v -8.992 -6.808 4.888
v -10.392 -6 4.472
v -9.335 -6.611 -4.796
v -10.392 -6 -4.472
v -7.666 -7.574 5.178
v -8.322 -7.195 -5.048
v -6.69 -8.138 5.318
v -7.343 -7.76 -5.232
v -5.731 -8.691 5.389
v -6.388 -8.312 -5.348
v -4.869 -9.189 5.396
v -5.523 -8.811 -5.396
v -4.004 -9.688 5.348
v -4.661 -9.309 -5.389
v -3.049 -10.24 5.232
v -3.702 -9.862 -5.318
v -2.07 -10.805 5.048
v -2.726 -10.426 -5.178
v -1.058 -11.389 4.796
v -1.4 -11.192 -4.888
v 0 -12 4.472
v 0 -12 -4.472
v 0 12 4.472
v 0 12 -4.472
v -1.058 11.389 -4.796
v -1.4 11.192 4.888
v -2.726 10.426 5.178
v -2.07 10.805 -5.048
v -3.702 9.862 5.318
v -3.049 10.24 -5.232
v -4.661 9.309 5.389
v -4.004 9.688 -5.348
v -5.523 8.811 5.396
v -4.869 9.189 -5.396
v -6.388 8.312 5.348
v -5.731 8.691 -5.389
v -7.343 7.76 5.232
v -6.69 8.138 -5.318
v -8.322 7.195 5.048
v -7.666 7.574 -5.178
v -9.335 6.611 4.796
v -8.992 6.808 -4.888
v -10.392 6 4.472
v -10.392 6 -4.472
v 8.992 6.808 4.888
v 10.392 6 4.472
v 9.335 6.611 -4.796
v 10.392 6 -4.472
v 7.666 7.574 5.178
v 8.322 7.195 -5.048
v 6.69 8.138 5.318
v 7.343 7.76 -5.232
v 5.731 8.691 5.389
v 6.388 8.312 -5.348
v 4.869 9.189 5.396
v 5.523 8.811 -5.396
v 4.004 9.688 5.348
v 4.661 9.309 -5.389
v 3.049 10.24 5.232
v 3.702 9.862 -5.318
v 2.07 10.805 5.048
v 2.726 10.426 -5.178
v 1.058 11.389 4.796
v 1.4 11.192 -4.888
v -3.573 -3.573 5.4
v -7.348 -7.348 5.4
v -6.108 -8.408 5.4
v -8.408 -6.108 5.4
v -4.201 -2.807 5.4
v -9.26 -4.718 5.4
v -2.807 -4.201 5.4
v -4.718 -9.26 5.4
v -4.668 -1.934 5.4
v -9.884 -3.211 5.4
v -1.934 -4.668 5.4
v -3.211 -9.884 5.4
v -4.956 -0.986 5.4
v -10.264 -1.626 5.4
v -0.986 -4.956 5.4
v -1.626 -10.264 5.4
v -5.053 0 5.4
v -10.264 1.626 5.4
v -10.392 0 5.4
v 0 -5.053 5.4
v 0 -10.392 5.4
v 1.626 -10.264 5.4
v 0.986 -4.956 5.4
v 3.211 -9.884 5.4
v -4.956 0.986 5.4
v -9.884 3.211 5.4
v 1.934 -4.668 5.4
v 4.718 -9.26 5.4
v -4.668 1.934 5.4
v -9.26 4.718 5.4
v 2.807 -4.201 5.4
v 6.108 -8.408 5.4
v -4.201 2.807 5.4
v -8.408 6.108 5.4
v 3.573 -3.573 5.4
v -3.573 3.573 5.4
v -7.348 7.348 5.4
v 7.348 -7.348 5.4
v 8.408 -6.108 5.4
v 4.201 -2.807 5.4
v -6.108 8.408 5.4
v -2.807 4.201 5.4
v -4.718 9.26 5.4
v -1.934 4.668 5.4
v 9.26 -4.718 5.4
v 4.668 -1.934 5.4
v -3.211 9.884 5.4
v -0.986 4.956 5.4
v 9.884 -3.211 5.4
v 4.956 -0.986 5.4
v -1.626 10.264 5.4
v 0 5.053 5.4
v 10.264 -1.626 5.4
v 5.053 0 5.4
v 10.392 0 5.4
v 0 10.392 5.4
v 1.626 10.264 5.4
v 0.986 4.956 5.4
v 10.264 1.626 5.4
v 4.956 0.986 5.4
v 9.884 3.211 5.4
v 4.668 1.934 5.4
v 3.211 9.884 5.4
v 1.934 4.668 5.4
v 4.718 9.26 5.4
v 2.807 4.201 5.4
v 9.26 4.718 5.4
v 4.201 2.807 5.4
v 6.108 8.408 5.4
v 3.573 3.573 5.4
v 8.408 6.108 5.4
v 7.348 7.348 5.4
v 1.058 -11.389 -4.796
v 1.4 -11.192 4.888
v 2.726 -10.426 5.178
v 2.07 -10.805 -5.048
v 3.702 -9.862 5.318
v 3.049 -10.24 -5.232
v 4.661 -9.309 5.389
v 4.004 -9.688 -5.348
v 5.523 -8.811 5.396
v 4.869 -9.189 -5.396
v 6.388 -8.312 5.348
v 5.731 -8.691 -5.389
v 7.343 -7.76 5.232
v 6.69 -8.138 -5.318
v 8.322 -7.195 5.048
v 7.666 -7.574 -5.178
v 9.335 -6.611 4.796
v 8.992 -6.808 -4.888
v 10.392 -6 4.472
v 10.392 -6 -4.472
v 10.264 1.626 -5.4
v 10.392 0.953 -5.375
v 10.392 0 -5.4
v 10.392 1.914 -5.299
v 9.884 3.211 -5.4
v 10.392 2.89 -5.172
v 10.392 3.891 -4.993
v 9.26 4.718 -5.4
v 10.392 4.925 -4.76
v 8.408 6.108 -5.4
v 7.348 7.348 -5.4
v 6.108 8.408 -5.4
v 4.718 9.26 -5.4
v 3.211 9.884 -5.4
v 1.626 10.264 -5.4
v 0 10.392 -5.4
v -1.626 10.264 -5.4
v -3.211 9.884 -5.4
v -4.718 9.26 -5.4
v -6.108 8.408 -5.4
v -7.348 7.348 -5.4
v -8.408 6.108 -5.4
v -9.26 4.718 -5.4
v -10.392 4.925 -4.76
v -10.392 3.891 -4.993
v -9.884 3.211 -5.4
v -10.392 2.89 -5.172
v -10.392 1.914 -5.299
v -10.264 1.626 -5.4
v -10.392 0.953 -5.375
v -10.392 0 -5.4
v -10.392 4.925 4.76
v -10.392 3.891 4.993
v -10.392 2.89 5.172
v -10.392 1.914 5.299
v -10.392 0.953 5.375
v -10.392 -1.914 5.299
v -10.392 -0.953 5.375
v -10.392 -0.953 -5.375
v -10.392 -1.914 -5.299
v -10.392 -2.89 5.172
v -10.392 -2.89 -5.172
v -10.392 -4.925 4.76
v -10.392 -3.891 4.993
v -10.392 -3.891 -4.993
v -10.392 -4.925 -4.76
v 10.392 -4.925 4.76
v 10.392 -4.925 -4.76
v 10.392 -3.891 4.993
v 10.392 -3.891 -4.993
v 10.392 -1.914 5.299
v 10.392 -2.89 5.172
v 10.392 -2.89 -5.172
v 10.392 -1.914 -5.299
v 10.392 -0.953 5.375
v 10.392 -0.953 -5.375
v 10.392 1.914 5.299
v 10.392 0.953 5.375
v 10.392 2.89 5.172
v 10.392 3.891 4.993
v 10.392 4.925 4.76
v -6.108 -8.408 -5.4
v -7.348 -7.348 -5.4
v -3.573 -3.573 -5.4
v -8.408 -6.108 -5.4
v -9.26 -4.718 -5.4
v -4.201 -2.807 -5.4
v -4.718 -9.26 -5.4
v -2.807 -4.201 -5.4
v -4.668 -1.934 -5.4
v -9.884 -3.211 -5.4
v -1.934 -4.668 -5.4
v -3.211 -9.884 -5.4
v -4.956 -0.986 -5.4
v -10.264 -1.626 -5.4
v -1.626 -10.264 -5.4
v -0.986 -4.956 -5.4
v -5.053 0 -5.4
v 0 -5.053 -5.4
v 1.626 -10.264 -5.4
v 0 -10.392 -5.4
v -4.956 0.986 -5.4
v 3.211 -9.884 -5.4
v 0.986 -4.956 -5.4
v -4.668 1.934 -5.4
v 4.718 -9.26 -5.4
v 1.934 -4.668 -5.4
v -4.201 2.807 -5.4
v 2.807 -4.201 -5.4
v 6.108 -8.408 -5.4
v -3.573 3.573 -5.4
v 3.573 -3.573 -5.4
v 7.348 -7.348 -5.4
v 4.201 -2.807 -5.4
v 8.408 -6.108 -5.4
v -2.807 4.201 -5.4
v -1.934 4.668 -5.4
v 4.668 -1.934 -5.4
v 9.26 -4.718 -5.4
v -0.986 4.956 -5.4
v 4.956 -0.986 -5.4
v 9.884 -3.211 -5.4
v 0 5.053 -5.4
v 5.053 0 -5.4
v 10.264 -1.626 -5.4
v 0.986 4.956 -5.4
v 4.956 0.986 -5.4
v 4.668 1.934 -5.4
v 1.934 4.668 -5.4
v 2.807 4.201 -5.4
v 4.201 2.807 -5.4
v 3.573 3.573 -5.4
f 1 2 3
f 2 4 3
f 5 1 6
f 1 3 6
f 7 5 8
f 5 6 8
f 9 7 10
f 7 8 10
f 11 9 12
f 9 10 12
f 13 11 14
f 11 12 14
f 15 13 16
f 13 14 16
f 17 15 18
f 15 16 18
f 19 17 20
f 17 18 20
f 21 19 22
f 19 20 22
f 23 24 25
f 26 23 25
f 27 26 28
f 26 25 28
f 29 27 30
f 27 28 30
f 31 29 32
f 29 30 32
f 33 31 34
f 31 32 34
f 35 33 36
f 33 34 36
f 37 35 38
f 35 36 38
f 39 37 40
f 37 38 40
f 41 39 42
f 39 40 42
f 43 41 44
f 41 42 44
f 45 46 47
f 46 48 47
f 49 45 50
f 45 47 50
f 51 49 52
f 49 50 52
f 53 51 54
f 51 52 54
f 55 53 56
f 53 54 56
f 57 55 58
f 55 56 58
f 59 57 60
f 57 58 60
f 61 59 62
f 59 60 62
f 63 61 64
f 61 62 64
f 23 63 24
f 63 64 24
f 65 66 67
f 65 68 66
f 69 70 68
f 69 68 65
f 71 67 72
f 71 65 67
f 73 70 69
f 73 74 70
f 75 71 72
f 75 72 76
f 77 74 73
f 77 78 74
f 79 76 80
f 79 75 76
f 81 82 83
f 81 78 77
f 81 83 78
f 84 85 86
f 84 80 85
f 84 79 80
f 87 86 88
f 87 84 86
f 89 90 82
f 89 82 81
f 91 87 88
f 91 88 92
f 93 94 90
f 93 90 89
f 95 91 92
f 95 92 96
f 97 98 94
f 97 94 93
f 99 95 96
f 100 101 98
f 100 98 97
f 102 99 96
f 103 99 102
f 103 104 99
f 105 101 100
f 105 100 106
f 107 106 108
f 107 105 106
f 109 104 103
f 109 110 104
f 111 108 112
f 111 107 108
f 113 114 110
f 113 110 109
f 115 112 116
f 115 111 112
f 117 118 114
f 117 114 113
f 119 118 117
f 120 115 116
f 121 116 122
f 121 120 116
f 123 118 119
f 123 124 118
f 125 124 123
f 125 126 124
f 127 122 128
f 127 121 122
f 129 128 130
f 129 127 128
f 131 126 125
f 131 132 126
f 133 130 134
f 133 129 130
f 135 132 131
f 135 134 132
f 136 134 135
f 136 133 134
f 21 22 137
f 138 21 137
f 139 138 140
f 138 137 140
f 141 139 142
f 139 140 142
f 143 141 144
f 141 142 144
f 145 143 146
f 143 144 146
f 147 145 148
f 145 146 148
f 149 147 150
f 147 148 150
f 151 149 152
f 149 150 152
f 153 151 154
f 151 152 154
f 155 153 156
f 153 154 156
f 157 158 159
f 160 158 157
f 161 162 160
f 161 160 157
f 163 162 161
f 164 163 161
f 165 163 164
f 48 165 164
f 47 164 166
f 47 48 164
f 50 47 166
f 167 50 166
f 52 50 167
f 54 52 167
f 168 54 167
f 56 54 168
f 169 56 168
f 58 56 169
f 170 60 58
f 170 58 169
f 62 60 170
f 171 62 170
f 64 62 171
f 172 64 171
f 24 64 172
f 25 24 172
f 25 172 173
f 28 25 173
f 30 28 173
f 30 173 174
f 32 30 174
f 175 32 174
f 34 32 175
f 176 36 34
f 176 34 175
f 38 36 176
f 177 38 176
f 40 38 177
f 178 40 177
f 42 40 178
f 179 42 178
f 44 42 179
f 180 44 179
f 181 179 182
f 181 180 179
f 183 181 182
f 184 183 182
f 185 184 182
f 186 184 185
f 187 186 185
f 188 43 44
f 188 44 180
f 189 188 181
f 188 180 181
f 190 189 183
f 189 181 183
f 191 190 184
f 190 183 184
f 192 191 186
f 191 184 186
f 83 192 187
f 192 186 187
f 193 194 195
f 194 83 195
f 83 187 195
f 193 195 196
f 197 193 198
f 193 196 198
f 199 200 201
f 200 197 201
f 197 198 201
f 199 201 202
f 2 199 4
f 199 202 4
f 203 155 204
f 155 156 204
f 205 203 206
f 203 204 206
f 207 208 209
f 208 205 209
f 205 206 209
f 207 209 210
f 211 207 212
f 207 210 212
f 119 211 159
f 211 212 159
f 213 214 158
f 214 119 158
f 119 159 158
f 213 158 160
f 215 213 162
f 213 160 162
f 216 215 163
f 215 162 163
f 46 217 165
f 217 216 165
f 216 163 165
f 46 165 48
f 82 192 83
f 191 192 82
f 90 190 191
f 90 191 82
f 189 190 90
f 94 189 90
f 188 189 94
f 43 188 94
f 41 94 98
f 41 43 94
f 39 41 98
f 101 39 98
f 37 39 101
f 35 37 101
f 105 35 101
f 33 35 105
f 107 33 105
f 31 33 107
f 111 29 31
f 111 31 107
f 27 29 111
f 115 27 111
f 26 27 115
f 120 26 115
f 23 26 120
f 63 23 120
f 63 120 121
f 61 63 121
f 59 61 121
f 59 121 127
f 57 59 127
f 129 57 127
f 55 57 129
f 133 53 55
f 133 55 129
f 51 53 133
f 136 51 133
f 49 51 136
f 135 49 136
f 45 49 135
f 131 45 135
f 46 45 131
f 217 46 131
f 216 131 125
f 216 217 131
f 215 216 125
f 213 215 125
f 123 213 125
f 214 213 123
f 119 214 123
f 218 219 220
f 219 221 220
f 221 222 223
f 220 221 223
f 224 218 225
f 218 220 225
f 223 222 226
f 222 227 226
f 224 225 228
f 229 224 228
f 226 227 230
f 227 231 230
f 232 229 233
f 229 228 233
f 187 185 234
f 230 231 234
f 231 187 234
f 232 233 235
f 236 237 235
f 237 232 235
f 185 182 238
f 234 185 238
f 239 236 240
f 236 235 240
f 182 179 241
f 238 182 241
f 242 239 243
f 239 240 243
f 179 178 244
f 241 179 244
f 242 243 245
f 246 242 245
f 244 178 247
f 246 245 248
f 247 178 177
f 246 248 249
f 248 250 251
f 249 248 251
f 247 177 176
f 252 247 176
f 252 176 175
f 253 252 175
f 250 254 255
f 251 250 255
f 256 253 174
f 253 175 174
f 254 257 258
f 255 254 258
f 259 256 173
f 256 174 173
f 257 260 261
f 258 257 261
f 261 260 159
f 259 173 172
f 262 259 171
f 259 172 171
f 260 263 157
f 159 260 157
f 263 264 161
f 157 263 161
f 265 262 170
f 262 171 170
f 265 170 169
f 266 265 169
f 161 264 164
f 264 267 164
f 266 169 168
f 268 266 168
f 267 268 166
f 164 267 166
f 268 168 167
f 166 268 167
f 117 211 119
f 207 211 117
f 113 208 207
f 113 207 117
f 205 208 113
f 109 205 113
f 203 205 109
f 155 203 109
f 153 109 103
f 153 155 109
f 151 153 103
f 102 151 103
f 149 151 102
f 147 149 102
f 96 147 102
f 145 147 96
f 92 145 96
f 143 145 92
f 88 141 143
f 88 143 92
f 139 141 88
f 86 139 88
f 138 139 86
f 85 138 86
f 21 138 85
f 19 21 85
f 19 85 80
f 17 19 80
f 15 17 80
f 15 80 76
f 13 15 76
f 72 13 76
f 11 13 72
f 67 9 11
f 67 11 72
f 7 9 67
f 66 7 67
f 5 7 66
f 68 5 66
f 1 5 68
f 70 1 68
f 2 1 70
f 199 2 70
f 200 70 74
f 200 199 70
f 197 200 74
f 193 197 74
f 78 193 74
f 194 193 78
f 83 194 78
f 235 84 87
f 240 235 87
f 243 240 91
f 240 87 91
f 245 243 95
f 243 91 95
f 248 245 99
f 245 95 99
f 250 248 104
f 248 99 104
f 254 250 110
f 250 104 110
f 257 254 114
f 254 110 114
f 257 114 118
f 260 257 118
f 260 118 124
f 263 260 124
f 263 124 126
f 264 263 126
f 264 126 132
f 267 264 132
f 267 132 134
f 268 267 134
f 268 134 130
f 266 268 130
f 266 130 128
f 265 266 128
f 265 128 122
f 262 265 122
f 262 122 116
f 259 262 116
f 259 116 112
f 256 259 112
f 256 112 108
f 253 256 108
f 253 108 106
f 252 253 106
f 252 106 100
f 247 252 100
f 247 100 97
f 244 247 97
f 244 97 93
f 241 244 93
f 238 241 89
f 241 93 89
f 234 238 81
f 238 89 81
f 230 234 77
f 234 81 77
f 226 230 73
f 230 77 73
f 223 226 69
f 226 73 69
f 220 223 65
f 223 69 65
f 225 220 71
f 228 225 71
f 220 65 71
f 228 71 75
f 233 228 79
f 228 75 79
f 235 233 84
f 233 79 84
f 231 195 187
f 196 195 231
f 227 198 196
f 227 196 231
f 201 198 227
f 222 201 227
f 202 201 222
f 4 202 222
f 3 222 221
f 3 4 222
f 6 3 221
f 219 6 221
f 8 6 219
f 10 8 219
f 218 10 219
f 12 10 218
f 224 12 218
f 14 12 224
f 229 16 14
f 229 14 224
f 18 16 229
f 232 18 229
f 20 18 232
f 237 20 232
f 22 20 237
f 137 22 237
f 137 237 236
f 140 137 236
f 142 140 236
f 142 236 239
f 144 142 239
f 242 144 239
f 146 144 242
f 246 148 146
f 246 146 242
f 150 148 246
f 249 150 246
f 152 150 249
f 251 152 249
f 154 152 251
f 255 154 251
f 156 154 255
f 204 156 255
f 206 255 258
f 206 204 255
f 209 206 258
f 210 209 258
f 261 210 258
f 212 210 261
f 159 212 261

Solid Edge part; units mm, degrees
sketch "Sketch1" plane through (0, 0, 0) normal (0, 0, 1) x (1, 0, 0)
  line L0 (0, 12) -> (-10.3923, 6)
  line L1 (-10.3923, 6) -> (-10.3923, -6)
  line L2 (-10.3923, -6) -> (0, -12)
  line L3 (0, -12) -> (10.3923, -6)
  line L4 (10.3923, -6) -> (10.3923, 6)
  line L5 (10.3923, 6) -> (0, 12)
extrude "Protrusion1" add sketch "Sketch1" along normal mid plane 10.8
sketch "Sketch2" plane through (0, 0, 0) normal (0, -1, 0) x (1, 0, 0)
  line L0 (10.3923, -5.4) -> (40.2366, 11.8306)
revolve "RevolvedCutout1" cut sketch "Sketch2" angle 360 about axis through (0, 0, 54) along (0, 0, -1) material side at (25.3394, 0, 3.172)
mirror "Mirror1" about plane through (0, 0, 0) normal (0, 0, 1) of "RevolvedCutout1"
hole "Hole_1" at (0, 0, 5.4) direction (0, 0, -1) diameter 10.106 end through all
properties part number "2"
